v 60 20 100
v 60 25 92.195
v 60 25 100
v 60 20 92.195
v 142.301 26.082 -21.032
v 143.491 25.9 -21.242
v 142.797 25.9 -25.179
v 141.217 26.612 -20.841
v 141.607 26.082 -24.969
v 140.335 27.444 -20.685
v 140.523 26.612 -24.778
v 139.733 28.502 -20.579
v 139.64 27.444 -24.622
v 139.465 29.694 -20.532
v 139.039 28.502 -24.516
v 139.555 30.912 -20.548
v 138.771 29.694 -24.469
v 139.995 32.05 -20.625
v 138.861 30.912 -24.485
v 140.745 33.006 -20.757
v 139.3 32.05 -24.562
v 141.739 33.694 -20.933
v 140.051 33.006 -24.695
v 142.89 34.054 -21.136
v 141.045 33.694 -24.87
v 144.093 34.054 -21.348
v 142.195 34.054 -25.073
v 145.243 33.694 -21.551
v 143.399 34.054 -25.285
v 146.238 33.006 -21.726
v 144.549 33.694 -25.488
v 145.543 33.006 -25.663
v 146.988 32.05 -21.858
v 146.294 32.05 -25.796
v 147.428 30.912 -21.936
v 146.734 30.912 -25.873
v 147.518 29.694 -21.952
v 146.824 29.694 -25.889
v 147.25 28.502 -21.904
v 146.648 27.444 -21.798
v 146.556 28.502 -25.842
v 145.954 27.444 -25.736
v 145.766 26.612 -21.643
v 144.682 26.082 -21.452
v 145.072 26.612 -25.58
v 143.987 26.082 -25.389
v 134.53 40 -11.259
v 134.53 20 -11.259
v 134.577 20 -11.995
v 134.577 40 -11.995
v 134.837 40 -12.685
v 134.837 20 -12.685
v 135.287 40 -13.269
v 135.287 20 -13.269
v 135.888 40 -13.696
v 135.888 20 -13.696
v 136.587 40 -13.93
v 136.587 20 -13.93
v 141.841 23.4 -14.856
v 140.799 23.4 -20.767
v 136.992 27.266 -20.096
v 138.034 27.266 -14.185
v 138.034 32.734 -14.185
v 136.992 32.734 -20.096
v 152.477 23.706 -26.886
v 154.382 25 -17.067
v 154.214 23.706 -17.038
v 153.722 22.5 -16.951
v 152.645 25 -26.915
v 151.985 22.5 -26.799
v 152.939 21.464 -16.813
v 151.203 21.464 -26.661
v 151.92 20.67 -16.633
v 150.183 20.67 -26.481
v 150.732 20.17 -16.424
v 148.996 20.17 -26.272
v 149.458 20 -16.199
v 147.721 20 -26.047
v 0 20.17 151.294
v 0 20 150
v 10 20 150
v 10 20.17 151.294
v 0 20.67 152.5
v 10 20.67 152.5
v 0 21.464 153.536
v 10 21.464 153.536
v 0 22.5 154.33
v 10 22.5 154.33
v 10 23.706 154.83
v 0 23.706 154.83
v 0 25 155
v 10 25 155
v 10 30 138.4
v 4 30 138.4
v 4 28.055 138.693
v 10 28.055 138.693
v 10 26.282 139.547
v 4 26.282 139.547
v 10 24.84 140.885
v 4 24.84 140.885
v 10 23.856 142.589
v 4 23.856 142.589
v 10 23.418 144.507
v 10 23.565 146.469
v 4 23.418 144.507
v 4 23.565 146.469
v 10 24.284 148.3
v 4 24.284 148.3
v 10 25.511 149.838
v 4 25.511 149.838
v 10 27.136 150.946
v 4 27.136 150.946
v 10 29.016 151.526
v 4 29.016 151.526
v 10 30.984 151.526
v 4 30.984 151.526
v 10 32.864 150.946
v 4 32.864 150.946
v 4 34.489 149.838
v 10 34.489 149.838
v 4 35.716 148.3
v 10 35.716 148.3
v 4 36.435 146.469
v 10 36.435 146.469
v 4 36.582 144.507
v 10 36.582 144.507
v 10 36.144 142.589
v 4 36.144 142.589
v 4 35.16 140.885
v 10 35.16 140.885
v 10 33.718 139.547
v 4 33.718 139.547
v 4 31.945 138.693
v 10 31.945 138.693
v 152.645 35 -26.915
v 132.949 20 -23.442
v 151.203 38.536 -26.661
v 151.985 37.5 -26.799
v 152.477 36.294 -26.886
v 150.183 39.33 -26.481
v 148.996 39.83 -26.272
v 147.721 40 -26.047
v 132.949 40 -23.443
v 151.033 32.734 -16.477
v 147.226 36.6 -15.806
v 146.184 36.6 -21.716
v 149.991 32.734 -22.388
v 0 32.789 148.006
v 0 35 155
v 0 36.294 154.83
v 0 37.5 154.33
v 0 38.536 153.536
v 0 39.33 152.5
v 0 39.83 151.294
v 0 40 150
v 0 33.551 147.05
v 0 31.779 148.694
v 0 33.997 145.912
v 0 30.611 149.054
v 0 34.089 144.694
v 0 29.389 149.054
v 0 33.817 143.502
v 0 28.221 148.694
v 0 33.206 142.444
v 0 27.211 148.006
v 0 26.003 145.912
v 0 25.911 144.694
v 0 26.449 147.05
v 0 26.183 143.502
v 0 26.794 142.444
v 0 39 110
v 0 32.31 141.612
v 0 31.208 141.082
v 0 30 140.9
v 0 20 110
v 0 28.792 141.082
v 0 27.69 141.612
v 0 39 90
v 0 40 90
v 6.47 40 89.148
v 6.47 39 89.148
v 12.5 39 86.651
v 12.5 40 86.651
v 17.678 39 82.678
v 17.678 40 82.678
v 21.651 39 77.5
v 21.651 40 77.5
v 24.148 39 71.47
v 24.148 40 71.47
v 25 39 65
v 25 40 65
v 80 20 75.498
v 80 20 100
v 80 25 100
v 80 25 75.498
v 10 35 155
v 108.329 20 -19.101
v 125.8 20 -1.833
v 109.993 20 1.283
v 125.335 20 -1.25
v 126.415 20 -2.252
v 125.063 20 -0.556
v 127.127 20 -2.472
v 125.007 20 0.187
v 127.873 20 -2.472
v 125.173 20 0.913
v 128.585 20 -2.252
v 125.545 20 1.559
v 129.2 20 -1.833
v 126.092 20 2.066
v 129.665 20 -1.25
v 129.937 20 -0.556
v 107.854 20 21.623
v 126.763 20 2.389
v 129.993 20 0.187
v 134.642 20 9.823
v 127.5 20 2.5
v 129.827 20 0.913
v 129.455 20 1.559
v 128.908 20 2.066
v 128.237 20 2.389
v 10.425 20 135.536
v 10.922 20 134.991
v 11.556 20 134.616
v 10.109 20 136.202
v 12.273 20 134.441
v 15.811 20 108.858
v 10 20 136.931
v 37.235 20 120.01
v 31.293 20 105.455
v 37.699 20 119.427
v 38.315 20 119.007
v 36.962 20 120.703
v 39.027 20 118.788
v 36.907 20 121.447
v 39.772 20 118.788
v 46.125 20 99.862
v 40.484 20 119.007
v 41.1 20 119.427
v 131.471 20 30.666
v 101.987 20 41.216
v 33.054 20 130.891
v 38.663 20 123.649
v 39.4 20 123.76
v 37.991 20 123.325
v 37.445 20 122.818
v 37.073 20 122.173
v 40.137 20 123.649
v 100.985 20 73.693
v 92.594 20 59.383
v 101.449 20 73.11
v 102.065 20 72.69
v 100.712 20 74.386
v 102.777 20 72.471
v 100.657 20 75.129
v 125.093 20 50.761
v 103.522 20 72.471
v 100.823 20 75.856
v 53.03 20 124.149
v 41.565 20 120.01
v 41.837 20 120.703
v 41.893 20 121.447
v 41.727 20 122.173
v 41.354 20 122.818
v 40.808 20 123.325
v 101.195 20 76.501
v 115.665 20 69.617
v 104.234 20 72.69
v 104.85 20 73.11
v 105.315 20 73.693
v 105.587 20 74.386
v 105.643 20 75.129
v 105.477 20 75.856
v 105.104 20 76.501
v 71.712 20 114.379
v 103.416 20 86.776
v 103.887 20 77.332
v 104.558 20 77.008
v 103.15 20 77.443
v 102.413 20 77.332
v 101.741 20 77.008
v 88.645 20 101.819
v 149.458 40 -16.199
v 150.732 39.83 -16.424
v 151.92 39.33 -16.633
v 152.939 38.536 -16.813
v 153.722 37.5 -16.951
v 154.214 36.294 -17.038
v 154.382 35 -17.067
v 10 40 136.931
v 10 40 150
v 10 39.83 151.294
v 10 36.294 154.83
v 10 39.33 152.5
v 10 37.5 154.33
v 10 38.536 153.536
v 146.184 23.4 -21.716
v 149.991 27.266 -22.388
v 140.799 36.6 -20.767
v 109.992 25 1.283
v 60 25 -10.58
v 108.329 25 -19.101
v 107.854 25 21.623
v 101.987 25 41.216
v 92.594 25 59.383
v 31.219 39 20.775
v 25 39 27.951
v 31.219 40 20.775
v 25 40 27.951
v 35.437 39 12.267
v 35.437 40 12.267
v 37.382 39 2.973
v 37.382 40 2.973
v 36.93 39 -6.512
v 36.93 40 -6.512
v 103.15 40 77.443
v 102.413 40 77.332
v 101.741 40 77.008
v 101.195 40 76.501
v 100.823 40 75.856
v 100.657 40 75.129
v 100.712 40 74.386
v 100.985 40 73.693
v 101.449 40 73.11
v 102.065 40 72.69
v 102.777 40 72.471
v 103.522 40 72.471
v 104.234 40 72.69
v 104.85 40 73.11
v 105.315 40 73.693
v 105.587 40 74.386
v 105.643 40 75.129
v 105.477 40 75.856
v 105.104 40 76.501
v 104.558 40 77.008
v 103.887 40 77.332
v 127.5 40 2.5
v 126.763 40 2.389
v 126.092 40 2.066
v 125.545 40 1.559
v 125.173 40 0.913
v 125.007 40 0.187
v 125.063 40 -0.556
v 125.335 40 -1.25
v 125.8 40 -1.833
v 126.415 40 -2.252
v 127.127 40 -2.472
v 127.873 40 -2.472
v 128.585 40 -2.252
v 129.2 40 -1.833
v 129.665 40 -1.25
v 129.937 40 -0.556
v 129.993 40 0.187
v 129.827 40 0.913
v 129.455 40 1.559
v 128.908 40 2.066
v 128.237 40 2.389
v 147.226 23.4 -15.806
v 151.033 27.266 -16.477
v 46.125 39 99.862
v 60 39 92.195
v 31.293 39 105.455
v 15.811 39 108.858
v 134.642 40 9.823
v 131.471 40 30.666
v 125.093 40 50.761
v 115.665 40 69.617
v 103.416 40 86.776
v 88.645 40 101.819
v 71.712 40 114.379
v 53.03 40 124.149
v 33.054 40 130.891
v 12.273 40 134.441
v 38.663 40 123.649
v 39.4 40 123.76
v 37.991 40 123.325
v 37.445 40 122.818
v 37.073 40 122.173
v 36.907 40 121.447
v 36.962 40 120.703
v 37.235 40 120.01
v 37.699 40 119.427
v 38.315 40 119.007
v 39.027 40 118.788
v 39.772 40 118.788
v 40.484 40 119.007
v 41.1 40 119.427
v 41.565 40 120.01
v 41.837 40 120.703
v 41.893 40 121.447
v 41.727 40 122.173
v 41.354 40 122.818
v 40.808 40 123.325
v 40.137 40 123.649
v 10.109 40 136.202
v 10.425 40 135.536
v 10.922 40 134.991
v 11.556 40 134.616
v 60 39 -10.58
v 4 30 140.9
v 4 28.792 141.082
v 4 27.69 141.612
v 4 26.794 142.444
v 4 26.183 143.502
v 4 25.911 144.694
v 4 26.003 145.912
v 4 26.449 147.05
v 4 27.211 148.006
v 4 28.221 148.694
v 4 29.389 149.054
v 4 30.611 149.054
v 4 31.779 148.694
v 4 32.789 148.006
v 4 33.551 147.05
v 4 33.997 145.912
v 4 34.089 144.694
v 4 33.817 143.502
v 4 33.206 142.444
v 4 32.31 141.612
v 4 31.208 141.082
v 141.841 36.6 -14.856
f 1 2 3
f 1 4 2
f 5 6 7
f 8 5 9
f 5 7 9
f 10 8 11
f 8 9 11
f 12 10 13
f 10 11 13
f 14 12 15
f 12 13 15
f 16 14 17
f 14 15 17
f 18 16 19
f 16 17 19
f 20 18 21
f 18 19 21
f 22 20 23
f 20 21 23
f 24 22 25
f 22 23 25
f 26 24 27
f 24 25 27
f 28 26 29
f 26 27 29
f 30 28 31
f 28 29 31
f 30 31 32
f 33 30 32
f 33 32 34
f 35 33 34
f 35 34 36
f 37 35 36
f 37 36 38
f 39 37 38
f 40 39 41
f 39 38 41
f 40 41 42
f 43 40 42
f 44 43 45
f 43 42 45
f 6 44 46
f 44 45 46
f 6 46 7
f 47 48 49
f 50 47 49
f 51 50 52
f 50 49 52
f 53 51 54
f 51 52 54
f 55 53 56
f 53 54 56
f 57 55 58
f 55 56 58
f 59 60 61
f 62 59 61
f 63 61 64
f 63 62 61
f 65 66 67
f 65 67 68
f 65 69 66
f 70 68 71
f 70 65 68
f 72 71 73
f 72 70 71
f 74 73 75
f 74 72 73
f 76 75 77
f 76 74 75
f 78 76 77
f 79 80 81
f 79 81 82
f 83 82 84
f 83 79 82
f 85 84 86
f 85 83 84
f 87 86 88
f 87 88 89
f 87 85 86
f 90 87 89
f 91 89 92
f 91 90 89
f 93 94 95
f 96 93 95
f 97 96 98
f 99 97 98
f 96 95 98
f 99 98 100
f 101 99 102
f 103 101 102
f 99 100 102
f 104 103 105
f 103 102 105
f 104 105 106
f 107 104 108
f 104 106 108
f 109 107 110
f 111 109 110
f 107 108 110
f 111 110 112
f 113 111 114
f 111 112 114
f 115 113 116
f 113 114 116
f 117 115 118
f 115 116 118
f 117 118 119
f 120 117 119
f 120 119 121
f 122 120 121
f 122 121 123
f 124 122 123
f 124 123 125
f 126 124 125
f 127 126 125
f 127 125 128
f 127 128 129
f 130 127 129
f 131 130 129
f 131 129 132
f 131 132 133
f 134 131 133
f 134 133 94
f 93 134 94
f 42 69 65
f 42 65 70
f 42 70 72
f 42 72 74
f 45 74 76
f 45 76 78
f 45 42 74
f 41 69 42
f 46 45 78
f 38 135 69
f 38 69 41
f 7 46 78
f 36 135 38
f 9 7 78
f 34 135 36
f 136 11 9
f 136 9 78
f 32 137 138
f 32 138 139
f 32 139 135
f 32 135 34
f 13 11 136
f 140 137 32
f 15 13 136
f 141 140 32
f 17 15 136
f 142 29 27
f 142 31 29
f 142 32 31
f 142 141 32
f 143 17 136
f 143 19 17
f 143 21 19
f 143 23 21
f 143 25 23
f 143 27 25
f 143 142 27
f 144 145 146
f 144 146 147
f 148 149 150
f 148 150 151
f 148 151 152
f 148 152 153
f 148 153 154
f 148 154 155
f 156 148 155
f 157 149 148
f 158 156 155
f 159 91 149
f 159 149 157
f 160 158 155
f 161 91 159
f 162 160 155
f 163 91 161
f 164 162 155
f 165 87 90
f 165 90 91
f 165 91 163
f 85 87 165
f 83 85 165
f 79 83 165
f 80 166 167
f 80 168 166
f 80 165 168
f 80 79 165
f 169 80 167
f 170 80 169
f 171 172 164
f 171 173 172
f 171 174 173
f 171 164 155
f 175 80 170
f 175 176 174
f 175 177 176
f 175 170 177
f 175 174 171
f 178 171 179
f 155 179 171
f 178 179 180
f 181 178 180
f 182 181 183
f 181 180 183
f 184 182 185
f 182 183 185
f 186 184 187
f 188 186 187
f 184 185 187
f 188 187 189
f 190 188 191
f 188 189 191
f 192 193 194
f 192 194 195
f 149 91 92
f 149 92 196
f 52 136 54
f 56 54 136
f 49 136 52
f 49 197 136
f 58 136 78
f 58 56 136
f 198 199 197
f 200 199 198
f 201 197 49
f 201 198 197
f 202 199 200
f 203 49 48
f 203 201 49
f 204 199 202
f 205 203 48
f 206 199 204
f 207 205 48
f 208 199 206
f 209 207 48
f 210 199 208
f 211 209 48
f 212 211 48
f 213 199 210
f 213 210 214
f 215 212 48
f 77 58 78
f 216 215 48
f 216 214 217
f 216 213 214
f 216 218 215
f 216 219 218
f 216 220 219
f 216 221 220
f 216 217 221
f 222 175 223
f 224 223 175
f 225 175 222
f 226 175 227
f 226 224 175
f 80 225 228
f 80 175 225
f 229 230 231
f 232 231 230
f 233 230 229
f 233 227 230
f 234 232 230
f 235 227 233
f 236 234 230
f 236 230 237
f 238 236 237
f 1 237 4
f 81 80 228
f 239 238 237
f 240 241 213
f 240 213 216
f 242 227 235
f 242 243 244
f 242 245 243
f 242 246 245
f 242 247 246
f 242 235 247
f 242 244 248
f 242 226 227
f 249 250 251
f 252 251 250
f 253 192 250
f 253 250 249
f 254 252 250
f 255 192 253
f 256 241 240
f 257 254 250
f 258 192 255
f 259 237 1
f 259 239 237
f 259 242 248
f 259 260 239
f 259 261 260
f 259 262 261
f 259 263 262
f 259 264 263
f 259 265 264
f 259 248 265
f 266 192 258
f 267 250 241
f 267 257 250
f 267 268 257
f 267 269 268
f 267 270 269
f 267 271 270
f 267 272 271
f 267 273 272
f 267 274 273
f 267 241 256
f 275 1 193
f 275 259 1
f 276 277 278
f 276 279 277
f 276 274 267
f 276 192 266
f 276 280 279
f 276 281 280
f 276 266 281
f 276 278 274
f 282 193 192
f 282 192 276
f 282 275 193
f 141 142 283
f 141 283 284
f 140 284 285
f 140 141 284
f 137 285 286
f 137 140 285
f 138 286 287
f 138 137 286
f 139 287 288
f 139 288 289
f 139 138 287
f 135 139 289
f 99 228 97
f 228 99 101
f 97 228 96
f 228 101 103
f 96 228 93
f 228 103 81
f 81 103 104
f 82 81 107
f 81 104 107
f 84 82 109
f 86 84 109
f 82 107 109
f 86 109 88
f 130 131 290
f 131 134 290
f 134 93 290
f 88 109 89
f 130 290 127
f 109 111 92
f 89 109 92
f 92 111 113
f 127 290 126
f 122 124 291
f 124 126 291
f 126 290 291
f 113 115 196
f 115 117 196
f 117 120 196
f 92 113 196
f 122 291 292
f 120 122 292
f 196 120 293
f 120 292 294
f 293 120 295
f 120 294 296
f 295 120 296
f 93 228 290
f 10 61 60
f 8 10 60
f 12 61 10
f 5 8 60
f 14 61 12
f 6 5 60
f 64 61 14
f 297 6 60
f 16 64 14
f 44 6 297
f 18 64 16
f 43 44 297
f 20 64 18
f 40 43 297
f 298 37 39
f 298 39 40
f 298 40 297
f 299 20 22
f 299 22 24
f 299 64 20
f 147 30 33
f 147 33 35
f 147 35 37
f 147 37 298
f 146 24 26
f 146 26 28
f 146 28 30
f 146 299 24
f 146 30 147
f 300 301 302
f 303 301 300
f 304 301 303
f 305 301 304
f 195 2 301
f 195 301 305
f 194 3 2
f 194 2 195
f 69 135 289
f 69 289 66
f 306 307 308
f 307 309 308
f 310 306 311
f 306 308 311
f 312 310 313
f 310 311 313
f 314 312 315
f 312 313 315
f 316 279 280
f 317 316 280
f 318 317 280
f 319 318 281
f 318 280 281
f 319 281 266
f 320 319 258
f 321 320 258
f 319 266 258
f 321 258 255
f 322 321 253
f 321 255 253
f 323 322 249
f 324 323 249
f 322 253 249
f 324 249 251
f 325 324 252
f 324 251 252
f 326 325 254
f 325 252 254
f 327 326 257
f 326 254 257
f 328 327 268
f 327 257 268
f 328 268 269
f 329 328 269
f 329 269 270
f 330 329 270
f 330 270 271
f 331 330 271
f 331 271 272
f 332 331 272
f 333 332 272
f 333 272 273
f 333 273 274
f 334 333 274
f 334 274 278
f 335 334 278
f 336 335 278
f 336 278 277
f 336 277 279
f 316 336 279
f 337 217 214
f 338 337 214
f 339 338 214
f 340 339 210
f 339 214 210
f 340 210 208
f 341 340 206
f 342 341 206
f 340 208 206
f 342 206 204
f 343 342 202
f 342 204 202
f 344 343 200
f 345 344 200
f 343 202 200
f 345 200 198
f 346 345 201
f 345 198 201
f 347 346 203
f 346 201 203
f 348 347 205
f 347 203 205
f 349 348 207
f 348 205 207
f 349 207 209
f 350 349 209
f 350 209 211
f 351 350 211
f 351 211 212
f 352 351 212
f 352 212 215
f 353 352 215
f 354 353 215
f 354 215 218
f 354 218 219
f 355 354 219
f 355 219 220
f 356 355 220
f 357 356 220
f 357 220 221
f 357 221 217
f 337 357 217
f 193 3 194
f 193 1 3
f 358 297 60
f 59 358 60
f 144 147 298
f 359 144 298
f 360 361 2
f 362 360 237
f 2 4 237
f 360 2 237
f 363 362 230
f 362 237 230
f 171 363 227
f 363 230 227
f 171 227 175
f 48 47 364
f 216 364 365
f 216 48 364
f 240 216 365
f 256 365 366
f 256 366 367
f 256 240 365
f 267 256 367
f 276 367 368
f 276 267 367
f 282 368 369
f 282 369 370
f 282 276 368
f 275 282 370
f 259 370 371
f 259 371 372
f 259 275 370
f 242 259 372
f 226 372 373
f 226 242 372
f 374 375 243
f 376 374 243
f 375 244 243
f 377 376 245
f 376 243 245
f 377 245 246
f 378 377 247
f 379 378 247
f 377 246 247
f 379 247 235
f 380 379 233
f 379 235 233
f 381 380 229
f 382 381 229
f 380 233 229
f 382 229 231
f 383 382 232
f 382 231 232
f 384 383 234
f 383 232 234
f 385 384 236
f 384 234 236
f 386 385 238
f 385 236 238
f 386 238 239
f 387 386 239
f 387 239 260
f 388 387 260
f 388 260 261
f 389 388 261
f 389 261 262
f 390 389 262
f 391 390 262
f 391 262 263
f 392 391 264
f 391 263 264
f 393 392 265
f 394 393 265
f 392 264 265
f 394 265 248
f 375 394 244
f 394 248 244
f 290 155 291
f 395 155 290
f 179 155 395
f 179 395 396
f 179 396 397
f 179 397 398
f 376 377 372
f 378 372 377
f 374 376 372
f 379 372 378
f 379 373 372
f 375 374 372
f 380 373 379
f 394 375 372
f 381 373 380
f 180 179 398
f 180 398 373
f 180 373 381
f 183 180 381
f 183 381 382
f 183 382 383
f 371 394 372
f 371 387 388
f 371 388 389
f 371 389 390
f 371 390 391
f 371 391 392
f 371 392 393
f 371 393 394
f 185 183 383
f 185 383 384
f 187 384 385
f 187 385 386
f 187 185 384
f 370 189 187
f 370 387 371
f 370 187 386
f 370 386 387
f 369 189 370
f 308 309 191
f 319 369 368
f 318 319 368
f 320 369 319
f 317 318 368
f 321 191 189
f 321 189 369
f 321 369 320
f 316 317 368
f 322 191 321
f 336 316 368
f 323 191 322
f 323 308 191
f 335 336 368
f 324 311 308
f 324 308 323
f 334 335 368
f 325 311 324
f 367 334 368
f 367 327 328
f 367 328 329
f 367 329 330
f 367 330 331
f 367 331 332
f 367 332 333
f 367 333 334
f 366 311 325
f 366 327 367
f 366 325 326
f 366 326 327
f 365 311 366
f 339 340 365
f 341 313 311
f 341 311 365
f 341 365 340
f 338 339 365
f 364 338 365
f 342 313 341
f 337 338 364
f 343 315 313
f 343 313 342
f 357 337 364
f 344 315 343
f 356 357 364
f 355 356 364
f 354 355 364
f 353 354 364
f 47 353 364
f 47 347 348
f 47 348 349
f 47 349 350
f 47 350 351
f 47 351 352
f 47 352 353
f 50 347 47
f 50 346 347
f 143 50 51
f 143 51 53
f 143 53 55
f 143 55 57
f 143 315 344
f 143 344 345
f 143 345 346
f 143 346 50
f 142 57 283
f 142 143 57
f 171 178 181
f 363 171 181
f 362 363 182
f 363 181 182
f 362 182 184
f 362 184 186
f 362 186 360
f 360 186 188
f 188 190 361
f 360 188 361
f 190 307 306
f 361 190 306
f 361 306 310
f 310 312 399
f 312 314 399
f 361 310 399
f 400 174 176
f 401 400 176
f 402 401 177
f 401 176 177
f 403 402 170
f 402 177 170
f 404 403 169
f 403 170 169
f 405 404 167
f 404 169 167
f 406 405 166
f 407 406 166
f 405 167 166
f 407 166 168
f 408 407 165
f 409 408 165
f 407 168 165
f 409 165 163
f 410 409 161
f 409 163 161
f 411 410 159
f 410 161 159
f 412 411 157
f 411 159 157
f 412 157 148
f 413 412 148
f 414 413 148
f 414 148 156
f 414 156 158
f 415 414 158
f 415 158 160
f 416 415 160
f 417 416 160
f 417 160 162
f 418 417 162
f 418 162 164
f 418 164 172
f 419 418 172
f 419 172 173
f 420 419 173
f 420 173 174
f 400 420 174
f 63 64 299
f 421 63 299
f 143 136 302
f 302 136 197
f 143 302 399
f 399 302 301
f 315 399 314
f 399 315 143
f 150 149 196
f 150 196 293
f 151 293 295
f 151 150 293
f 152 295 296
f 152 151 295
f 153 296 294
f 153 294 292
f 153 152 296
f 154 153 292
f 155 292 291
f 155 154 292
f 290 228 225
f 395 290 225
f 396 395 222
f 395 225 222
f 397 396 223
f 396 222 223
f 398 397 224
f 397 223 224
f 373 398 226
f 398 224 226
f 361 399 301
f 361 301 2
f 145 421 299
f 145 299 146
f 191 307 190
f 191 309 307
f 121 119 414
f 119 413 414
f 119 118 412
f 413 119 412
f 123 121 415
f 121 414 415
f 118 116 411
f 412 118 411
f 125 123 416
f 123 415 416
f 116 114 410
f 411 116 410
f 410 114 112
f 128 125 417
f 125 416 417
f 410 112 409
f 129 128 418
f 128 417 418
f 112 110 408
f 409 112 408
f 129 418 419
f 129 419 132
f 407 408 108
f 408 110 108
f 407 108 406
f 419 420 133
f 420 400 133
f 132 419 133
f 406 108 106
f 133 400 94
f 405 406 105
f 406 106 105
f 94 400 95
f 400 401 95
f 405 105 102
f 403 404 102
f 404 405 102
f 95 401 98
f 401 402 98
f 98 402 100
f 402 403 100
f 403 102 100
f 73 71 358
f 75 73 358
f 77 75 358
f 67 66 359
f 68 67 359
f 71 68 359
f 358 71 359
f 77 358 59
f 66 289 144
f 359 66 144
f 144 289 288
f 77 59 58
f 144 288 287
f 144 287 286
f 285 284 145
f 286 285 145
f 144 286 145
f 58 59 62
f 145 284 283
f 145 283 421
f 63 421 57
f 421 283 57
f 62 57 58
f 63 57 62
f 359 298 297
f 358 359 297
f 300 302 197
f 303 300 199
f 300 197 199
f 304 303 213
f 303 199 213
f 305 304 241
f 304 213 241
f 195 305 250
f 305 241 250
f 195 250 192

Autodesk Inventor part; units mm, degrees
ref_plane "YZ Plane" through (0, 0, 0) normal (1, 0, 0) x (0, 1, 0)
ref_plane "XZ Plane" through (0, 0, 0) normal (0, 1, 0) x (-1, 0, 0)
ref_plane "XY Plane" through (0, 0, 0) normal (0, 0, 1) x (1, 0, 0)
sketch "Sketch1" plane through (0, 0, 0) normal (0, 1, 0) x (-1, 0, 0)
  circle A0 centre (0, 0) radius 135
  circle A1 centre (0, 0) radius 110
  dimension "d0" = 270
  dimension "d1" = 220
extrude "Extrusion1" add sketch "Sketch1" along normal blind 55
sketch "Sketch2" plane through (0, 0, 0) normal (0, 0, 1) x (1, 0, 0)
  circle A0 centre (0, 5) radius 18
  line L0 (135, 0) -> (-135, 0) projected
  point P0 (0, 0)
  dimension "d4" = 36
  dimension "d5" = 5
extrude "Extrusion2" cut sketch "Sketch2" against normal through all
sketch "Sketch3" plane through (0, 0, 0) normal (0, -1, 0) x (1, 0, 0)
  circle A0 centre (0, 0) radius 140
extrude "Extrusion3" cut sketch "Sketch3" against normal blind 20
sketch "Sketch4" plane through (0, 20, 0) normal (0, -1, 0) x (1, 0, 0)
  line L0 (0, 0) -> (70, 0)
  line L1 (80, -100) -> (60, -100)
  line L2 (60, -100) -> (60, 100)
  line L3 (60, 100) -> (80, 100)
  line L4 (80, 100) -> (80, -100)
  line L5 (80, -100) -> (60, 100) construction
  line L6 (60, -100) -> (80, 100) construction
  dimension "d10" = 70
  dimension "d11" = 20
  dimension "d12" = 200
extrude "Extrusion4" cut sketch "Sketch4" against normal through all
sketch "Sketch5" plane through (0, 55, 0) normal (0, 1, 0) x (1, 0, 0)
  circle A0 centre (0, 0) radius 127.5
  circle A1 centre (127.5, 0) radius 2
  circle A2 centre (103.1497, 74.9426) radius 2
  circle A3 centre (39.3997, 121.2597) radius 2
  circle A4 centre (-39.3997, 121.2597) radius 2
  circle A5 centre (-103.1497, 74.9426) radius 2
  circle A6 centre (-127.5, 0) radius 2
  circle A7 centre (-103.1497, -74.9426) radius 2
  circle A8 centre (-39.3997, -121.2597) radius 2
  circle A9 centre (39.3997, -121.2597) radius 2
  circle A10 centre (103.1497, -74.9426) radius 2
  dimension "d15" = 255
  dimension "d16" = 4
  dimension "d19" = 360
hole "Hole1" at (127.5, 55, 0) at (103.1497, 55, 74.9426) at (39.3997, 55, 121.2597) at (-39.3997, 55, 121.2597) at (-103.1497, 55, 74.9426) at (-127.5, 55, 0) at (-103.1497, 55, -74.9426) at (-39.3997, 55, -121.2597) at (39.3997, 55, -121.2597) at (103.1497, 55, -74.9426) direction (0, -1, 0) diameter 5 end through all
sketch "Sketch6" plane through (0, 55, 0) normal (0, 1, 0) x (1, 0, 0)
  circle A0 centre (0, 0) radius 140
extrude "Extrusion5" cut sketch "Sketch6" against normal blind 15
sketch "Sketch7" plane through (0, 40, 0) normal (0, 1, 0) x (1, 0, 0)
  circle A0 centre (0, 0) radius 140
  line L0 (80, -100) -> (80, -75.4983) projected
  line L1 (80, -100) -> (80, -75.4983)
  line L2 (60, -100) -> (80, -100) projected
  line L3 (80, -100) -> (60, -100)
  line L4 (60, -100) -> (60, -92.1954)
  line L5 (60, 100) -> (60, 92.1954) projected
  line L6 (60, 92.1954) -> (60, 100)
  line L7 (60, 100) -> (80, 100)
  line L8 (80, 100) -> (80, 75.4983)
  arc A1 (80, -75.4983) -> (80, 75.4983) centre (0, 0) ccw
  arc A2 (60, 92.1954) -> (60, -92.1954) centre (0, 0) ccw
  arc A3 (-25, -65) -> (25, -65) centre (0, -65) ccw
  arc A4 (25, 65) -> (-25, 65) centre (0, 65) ccw
  arc A5 (25, -27.9508) -> (25, 27.9508) centre (0, 0) ccw
  arc A6 (-25, 27.9508) -> (-25, -27.9508) centre (0, 0) ccw
  line L9 (25, 65) -> (25, 27.9508)
  line L10 (25, -27.9508) -> (25, -65)
  line L11 (-25, -65) -> (-25, -27.9508)
  line L12 (-25, 27.9508) -> (-25, 65)
extrude "Extrusion6" add sketch "Sketch7" against normal blind 1 contours L2 L4 A2 L5 L7 L8 A1 L0
sketch "Sketch8" plane through (0, 39, 0) normal (0, -1, 0) x (1, 0, 0)
  line L0 (80, -75.4983) -> (80, -100) projected
  line L1 (80, -100) -> (60, -100)
  line L2 (60, -100) -> (60, 100)
  line L3 (60, 100) -> (80, 100)
  line L4 (80, 100) -> (80, 75.4983)
  line L5 (80, -75.4983) -> (80, -100)
  arc A0 (80, -75.4983) -> (80, 75.4983) centre (0, 0) ccw
  arc A1 (60, 92.1954) -> (60, -92.1954) centre (0, 0) ccw
extrude "Extrusion7" add sketch "Sketch8" along normal blind 14 contours L0 L1 L2 L3 L4 A0
sketch "Sketch9" plane through (0, 20, 0) normal (0, -1, 0) x (1, 0, 0)
  arc A0 (9.9499, -134.6328) -> (-9.9499, -134.6328) centre (0, 0) ccw projected
  spline S0 degree 7 poles (9.9499, -134.6328) (9.4556, -134.6694) (8.9421, -134.7052) (8.4096, -134.74) (7.8582, -134.7735) (7.2882, -134.8052) (6.6998, -134.835) (5.2633, -134.8999) (4.3998, -134.933) (3.5087, -134.9604) (2.5962, -134.9814) (1.6691, -134.9951) (0.7345, -135.0012) (-1.7136, -134.9976) (-3.2083, -134.9756) (-4.6621, -134.9347) (-6.0536, -134.8776) (-7.364, -134.8084) (-8.5782, -134.7318) (-9.7236, -134.6494) (-9.7616, -134.6466) (-9.7995, -134.6439) (-9.8372, -134.6411) (-9.8749, -134.6384) (-9.9124, -134.6356) (-9.9499, -134.6328) knots 0 0 0 0 0 0 0 0 0.214533 0.214533 0.214533 0.214533 0.214533 0.214533 0.508291 0.508291 0.508291 0.508291 0.508291 0.508291 0.983641 0.983641 0.983641 0.983641 0.983641 0.983641 1 1 1 1 1 1 1 1 projected
  line L0 (0, 135) -> (0, -135)
  line L1 (132.949, -23.4425) -> (-132.949, 23.4425)
  point P0 (0, 0)
  dimension "d40" = 80
extrude "Extrusion8" cut sketch "Sketch9" against normal through all contours S0 L0 L1 A0 | S0 A0 L1 L0 | L0 L1 A0 picked at (-5.2242, 89.6957)
sketch "Sketch10" plane through (0, 20, 110) normal (-1, 0, 0) x (0, 0, 1)
  line L0 (25, 0) -> (-133.4425, 0) projected
  line L1 (22.5, 0) -> (40, 0)
  line L2 (45, 5) -> (45, 15)
  line L3 (40, 20) -> (22.5, 20)
  line L4 (22.5, 20) -> (22.5, 0)
  line L5 (25, 20) -> (25, 0) projected
  arc A0 (40, 0) -> (45, 5) centre (40, 5) ccw
  arc A1 (45, 15) -> (40, 20) centre (40, 15) ccw
  point P0 (-110, -20)
  point P1 (45, 20)
  point P2 (45, 0)
  dimension "d43" = 22.5
  dimension "d44" = 20
  dimension "d45" = 20
  dimension "d46" = 5
extrude "Extrusion9" add sketch "Sketch10" against normal blind 10
sketch "Sketch11" plane through (132.949, 20, -23.4425) normal (-0.1736482, 0, -0.9848078) x (-0.9848078, 0, 0.1736482)
  line L0 (0, 20) -> (97.5, 20) projected
  line L1 (2.5, 20) -> (-15, 20)
  line L2 (-20, 15) -> (-20, 5)
  line L3 (-15, 0) -> (2.5, 0)
  line L4 (2.5, 0) -> (2.5, 20)
  line L5 (0, 0) -> (0, 20) projected
  arc A0 (-20, 5) -> (-15, 0) centre (-15, 5) ccw
  arc A1 (-15, 20) -> (-20, 15) centre (-15, 15) ccw
  point P0 (135, -20)
  point P1 (-20, 0)
  point P2 (-20, 20)
  dimension "d49" = 22.5
  dimension "d50" = 20
  dimension "d51" = 20
  dimension "d52" = 5
extrude "Extrusion10" add sketch "Sketch11" against normal blind 10
fillet "Fillet1" radius 2.5 2 edges at (10, 30, 134.6291) (134.3203, 30, -13.53)
sketch "Sketch12" plane through (10, 20, 110) normal (1, 0, 0) x (0, 0, -1)
  line L0 (-40, 0) -> (-26.9306, 0) projected
  line L1 (-45, 15) -> (-45, 5) projected
  point P0 (110, -20)
  point P1 (-35, 10)
  dimension "d56" = 10
  dimension "d57" = 10
hole "Hole2" at (10, 30, 145) direction (-1, 0, 0) diameter 8.2 end through all counterbore diameter 13.2 counterbore depth 6
sketch "Sketch13" plane through (134.6855, 20, -13.5944) normal (0.1736482, 0, 0.9848078) x (0.9848078, 0, -0.1736482)
  line L0 (16.6, 7.2662) -> (12.7338, 3.4)
  line L1 (12.7338, 3.4) -> (7.2662, 3.4)
  line L2 (7.2662, 3.4) -> (3.4, 7.2662)
  line L3 (3.4, 7.2662) -> (3.4, 12.7338)
  line L4 (3.4, 12.7338) -> (7.2662, 16.6)
  line L5 (7.2662, 16.6) -> (12.7338, 16.6)
  line L6 (12.7338, 16.6) -> (16.6, 12.7338)
  line L7 (16.6, 12.7338) -> (16.6, 7.2662)
  line L8 (20, 5) -> (20, 15) projected
  line L9 (1.9306, 0) -> (15, 0) projected
  point P0 (-135, -20)
  point P1 (10, 10)
  point P2 (20, 10)
  dimension "d65" = 10
  dimension "d66" = 10
  dimension "d67" = 13.2
extrude "Extrusion11" cut sketch "Sketch13" against normal blind 6
sketch "Sketch14" plane through (133.6436, 20, -19.5033) normal (0.1736482, 0, 0.9848078) x (0.9848078, 0, -0.1736482)
  line L0 (1.9306, 0) -> (15, 0) projected
  line L1 (20, 5) -> (20, 15) projected
  point P0 (-135, -20)
  point P1 (10, 10)
  dimension "d70" = 10
  dimension "d71" = 10
hole "Hole3" at (143.4917, 30, -21.2398) direction (-0.1736482, 0, -0.9848078) diameter 8.2 end through all
properties part number "Cylinder Spacer Top_Q3"
